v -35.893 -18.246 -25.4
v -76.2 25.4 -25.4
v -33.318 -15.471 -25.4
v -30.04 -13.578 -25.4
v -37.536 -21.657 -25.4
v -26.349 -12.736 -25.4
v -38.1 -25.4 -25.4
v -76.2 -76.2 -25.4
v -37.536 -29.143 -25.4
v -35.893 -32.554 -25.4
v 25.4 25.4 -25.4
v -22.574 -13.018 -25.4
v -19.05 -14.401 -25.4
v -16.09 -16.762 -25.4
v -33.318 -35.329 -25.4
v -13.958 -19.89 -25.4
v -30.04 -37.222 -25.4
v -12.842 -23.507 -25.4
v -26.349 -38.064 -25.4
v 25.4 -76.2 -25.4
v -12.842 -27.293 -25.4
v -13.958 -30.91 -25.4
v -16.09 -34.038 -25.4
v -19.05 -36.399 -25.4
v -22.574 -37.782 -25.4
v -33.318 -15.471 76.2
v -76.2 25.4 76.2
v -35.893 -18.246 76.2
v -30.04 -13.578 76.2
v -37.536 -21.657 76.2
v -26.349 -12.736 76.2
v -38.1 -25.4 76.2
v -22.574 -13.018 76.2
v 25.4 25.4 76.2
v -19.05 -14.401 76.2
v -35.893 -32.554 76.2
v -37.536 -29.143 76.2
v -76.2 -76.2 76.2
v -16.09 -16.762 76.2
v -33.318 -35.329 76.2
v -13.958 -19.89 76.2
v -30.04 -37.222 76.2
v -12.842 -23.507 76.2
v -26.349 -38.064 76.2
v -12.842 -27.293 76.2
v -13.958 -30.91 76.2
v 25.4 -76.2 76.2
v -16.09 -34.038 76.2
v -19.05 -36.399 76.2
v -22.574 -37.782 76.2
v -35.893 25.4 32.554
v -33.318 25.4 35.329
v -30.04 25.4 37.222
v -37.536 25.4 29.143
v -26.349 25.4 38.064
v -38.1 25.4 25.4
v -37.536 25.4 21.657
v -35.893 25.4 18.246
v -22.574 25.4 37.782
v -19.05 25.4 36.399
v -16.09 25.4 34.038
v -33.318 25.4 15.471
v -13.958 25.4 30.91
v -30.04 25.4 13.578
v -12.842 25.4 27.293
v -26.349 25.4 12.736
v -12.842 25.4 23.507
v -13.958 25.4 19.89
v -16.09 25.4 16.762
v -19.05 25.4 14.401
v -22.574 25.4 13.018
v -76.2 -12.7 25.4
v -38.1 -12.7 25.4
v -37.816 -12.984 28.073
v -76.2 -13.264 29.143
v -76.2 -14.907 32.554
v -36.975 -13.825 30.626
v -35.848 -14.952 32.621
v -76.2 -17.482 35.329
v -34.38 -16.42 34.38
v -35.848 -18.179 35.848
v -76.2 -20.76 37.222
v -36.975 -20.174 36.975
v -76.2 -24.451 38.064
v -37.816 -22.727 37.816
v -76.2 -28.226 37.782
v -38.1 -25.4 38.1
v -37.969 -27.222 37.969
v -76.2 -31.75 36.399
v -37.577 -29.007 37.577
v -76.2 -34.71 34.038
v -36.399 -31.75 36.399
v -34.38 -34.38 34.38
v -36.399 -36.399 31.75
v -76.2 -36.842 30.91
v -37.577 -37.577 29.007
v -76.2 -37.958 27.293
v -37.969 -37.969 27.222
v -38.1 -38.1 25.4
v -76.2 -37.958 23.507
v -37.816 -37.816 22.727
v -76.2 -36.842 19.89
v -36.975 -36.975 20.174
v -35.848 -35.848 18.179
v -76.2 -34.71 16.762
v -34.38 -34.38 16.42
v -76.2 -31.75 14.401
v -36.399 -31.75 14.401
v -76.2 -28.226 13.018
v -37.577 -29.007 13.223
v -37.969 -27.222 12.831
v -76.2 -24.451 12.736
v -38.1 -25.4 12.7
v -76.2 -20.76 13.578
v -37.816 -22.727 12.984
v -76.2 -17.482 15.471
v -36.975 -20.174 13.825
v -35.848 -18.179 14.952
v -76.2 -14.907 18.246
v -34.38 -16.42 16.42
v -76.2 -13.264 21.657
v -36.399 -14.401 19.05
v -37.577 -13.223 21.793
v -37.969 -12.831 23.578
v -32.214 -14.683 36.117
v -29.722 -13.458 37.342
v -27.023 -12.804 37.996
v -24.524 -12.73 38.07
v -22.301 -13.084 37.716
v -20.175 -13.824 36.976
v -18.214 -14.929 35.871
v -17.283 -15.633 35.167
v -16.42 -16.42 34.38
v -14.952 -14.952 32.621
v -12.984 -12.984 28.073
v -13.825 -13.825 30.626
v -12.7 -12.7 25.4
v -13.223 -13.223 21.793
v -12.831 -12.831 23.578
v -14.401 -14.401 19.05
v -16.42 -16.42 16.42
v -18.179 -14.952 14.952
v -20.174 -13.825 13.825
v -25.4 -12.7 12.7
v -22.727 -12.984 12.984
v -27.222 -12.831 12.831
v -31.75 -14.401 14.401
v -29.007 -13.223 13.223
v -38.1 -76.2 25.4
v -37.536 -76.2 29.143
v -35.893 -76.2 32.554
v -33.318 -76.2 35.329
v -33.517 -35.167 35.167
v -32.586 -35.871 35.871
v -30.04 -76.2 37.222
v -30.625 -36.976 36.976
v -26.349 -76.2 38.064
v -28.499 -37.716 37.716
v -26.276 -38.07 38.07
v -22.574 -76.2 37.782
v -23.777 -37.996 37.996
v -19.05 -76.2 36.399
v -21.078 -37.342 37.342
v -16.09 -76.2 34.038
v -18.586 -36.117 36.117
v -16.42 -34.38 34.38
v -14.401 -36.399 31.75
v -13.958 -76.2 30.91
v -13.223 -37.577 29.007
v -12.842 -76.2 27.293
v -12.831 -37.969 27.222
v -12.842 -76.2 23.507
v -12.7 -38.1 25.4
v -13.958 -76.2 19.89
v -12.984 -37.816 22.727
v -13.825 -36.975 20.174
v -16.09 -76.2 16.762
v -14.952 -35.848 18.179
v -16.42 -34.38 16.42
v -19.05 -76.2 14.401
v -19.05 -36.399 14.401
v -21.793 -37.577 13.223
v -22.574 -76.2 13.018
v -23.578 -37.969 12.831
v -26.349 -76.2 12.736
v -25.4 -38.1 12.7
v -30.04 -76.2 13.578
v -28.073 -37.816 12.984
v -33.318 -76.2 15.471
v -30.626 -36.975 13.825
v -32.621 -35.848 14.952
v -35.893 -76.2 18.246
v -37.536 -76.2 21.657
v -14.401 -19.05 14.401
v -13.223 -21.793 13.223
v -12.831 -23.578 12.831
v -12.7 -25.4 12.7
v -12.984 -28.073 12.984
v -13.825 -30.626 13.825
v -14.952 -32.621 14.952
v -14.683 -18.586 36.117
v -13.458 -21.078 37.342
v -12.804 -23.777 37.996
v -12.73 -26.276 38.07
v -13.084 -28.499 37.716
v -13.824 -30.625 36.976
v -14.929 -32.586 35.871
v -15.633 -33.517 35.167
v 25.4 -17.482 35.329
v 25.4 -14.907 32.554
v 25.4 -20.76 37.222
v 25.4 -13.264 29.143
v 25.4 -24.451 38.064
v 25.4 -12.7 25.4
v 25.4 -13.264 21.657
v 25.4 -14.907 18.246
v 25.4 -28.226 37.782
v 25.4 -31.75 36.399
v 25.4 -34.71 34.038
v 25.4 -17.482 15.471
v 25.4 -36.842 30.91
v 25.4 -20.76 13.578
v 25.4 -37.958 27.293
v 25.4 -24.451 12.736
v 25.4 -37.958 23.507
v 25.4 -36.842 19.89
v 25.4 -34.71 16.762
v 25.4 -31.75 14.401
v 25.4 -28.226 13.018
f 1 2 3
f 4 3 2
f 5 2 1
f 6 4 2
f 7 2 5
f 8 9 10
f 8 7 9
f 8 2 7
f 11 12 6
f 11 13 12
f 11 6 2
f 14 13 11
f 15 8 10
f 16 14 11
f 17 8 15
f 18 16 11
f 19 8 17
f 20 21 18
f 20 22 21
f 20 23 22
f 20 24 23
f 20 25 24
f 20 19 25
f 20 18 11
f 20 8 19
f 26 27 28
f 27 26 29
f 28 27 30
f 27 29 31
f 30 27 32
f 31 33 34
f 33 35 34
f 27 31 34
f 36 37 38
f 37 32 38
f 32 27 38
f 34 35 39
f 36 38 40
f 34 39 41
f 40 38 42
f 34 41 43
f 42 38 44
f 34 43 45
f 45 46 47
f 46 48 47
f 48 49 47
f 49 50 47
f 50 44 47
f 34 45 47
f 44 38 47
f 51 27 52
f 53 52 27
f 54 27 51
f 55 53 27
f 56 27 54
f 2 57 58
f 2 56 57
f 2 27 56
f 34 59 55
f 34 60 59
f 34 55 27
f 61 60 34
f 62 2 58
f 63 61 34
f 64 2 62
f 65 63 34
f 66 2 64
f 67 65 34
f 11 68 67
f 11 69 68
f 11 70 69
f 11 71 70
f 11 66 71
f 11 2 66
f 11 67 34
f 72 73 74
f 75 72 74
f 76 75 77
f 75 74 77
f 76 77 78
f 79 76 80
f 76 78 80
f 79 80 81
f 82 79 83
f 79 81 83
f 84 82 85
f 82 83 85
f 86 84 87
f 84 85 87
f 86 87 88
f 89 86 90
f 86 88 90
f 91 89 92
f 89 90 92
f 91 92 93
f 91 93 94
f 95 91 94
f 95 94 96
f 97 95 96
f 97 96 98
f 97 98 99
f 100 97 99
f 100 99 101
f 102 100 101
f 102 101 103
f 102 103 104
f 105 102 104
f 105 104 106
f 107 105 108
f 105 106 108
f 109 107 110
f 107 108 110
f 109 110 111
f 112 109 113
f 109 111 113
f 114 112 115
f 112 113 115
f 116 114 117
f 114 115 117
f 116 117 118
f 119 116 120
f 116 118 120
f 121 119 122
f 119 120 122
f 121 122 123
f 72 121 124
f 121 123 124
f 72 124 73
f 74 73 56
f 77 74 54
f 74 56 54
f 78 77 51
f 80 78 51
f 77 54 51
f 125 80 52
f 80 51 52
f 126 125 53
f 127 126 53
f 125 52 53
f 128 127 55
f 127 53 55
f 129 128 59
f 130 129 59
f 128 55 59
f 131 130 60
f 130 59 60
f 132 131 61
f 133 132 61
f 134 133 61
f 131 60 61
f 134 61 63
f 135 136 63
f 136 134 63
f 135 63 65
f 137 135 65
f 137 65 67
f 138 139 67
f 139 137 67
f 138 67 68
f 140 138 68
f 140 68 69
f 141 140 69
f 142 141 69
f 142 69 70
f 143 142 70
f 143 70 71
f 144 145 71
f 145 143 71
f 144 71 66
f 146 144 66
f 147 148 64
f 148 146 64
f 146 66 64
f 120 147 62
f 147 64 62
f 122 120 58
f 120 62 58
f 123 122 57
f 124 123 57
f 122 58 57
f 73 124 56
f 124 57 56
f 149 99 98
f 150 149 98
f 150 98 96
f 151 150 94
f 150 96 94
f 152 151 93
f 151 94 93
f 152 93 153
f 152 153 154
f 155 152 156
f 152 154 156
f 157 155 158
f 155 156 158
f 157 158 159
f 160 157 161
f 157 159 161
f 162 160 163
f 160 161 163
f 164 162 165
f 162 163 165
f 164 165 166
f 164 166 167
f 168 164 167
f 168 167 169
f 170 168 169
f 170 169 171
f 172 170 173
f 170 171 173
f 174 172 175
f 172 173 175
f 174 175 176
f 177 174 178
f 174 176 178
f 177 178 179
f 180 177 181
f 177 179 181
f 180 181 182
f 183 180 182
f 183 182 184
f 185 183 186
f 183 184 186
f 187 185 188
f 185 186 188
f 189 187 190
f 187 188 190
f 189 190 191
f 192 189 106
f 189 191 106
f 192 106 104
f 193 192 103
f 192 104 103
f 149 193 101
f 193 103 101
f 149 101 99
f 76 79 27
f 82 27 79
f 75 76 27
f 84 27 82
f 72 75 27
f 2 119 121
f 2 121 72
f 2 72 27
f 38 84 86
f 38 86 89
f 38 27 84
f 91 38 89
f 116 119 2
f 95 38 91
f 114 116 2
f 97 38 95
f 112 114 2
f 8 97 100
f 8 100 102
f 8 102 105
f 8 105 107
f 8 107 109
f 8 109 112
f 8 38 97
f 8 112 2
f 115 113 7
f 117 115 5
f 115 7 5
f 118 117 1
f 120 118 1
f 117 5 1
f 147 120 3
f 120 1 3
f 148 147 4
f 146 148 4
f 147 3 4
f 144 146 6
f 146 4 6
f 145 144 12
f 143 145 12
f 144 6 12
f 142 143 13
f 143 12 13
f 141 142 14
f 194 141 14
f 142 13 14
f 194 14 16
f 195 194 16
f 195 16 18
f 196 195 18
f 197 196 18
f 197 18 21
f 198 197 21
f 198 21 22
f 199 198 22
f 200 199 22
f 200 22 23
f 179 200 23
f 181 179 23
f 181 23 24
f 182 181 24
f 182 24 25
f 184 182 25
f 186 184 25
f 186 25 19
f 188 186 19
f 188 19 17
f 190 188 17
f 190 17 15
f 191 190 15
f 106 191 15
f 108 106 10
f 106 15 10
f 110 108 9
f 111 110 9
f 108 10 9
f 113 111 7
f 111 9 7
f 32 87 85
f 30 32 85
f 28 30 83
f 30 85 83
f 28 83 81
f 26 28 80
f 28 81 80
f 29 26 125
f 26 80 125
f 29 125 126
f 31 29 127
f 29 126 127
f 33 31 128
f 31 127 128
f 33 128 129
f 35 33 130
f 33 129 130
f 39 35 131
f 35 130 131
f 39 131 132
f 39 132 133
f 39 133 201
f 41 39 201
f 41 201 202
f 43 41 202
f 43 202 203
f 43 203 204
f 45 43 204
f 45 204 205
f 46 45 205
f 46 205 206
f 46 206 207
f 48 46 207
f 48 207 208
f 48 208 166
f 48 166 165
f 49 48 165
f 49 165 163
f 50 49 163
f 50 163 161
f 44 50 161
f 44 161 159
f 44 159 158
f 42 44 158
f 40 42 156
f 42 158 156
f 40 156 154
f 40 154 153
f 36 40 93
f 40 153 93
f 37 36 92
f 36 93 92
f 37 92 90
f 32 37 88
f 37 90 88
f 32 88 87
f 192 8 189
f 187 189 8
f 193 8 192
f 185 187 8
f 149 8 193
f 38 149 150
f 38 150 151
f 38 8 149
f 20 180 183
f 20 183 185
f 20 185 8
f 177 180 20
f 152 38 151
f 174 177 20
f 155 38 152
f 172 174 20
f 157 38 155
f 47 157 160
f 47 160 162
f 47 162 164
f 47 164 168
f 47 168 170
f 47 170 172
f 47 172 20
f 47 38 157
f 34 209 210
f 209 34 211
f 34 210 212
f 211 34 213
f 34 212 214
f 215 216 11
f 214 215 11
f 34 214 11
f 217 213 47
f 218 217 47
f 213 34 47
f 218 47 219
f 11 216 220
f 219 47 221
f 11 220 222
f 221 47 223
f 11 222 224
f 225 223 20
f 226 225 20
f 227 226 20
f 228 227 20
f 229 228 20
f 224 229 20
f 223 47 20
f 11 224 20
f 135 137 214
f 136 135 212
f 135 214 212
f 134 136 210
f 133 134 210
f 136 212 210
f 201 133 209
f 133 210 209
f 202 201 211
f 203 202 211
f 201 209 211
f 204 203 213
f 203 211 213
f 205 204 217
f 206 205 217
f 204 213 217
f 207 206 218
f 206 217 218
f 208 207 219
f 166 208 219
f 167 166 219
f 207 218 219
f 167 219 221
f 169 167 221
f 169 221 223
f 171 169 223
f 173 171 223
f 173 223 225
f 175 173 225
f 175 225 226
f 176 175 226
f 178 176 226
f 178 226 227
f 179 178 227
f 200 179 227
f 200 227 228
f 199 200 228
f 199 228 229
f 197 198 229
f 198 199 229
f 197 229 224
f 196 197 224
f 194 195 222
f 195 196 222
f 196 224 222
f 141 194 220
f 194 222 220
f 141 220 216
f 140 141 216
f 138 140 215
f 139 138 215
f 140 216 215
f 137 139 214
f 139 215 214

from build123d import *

# Parameters (mm, degrees)
F0_W      = 50.8
F0_H      = 50.8
F1_DEPTH  = 50.8
F2_W      = 101.6
F2_H      = 101.6
F3_DEPTH  = 76.2
F3_FACE_W = 101.6
F3_FACE_H = 101.6
F4_DEPTH  = 25.4
F6_D      = 25.4
F8_D      = 25.4
F10_D     = 25.4


with BuildPart() as f1:
    # F0 (on Front) → F1 (new body)
    with BuildSketch(Plane.XZ):
        with Locations((-25.4, 25.4)):
            Rectangle(F0_W, F0_H)
    extrude(amount=F1_DEPTH)

    # F2 (on Front) → F3 (join)
    with BuildSketch(Plane.XZ):
        with Locations((-25.4, 25.4)):
            Rectangle(F2_W, F2_H)
    extrude(amount=F3_DEPTH)

    # F3_face (on face) → F4 (join)
    with BuildSketch(Plane(origin=(-25.4, 0, 25.4), x_dir=(1, 0, 0), z_dir=(0, 1, 0))):
        Rectangle(F3_FACE_W, F3_FACE_H)
    extrude(amount=F4_DEPTH)

    # F6 (through all)
    with Locations(Plane.XY.offset(76.2)):
        with Locations((-25.4, -25.4)):
            Hole(F6_D / 2)

    # F8 (through all)
    with Locations(Plane(origin=(-76.2, 0, 0), x_dir=(0, -1, 0), z_dir=(-1, 0, 0))):
        with Locations((25.4, 25.4)):
            Hole(F8_D / 2)

    # F10 (through all)
    with Locations(Plane.XZ.offset(76.2)):
        with Locations((-25.4, 25.4)):
            Hole(F10_D / 2)


solid = f1.part
